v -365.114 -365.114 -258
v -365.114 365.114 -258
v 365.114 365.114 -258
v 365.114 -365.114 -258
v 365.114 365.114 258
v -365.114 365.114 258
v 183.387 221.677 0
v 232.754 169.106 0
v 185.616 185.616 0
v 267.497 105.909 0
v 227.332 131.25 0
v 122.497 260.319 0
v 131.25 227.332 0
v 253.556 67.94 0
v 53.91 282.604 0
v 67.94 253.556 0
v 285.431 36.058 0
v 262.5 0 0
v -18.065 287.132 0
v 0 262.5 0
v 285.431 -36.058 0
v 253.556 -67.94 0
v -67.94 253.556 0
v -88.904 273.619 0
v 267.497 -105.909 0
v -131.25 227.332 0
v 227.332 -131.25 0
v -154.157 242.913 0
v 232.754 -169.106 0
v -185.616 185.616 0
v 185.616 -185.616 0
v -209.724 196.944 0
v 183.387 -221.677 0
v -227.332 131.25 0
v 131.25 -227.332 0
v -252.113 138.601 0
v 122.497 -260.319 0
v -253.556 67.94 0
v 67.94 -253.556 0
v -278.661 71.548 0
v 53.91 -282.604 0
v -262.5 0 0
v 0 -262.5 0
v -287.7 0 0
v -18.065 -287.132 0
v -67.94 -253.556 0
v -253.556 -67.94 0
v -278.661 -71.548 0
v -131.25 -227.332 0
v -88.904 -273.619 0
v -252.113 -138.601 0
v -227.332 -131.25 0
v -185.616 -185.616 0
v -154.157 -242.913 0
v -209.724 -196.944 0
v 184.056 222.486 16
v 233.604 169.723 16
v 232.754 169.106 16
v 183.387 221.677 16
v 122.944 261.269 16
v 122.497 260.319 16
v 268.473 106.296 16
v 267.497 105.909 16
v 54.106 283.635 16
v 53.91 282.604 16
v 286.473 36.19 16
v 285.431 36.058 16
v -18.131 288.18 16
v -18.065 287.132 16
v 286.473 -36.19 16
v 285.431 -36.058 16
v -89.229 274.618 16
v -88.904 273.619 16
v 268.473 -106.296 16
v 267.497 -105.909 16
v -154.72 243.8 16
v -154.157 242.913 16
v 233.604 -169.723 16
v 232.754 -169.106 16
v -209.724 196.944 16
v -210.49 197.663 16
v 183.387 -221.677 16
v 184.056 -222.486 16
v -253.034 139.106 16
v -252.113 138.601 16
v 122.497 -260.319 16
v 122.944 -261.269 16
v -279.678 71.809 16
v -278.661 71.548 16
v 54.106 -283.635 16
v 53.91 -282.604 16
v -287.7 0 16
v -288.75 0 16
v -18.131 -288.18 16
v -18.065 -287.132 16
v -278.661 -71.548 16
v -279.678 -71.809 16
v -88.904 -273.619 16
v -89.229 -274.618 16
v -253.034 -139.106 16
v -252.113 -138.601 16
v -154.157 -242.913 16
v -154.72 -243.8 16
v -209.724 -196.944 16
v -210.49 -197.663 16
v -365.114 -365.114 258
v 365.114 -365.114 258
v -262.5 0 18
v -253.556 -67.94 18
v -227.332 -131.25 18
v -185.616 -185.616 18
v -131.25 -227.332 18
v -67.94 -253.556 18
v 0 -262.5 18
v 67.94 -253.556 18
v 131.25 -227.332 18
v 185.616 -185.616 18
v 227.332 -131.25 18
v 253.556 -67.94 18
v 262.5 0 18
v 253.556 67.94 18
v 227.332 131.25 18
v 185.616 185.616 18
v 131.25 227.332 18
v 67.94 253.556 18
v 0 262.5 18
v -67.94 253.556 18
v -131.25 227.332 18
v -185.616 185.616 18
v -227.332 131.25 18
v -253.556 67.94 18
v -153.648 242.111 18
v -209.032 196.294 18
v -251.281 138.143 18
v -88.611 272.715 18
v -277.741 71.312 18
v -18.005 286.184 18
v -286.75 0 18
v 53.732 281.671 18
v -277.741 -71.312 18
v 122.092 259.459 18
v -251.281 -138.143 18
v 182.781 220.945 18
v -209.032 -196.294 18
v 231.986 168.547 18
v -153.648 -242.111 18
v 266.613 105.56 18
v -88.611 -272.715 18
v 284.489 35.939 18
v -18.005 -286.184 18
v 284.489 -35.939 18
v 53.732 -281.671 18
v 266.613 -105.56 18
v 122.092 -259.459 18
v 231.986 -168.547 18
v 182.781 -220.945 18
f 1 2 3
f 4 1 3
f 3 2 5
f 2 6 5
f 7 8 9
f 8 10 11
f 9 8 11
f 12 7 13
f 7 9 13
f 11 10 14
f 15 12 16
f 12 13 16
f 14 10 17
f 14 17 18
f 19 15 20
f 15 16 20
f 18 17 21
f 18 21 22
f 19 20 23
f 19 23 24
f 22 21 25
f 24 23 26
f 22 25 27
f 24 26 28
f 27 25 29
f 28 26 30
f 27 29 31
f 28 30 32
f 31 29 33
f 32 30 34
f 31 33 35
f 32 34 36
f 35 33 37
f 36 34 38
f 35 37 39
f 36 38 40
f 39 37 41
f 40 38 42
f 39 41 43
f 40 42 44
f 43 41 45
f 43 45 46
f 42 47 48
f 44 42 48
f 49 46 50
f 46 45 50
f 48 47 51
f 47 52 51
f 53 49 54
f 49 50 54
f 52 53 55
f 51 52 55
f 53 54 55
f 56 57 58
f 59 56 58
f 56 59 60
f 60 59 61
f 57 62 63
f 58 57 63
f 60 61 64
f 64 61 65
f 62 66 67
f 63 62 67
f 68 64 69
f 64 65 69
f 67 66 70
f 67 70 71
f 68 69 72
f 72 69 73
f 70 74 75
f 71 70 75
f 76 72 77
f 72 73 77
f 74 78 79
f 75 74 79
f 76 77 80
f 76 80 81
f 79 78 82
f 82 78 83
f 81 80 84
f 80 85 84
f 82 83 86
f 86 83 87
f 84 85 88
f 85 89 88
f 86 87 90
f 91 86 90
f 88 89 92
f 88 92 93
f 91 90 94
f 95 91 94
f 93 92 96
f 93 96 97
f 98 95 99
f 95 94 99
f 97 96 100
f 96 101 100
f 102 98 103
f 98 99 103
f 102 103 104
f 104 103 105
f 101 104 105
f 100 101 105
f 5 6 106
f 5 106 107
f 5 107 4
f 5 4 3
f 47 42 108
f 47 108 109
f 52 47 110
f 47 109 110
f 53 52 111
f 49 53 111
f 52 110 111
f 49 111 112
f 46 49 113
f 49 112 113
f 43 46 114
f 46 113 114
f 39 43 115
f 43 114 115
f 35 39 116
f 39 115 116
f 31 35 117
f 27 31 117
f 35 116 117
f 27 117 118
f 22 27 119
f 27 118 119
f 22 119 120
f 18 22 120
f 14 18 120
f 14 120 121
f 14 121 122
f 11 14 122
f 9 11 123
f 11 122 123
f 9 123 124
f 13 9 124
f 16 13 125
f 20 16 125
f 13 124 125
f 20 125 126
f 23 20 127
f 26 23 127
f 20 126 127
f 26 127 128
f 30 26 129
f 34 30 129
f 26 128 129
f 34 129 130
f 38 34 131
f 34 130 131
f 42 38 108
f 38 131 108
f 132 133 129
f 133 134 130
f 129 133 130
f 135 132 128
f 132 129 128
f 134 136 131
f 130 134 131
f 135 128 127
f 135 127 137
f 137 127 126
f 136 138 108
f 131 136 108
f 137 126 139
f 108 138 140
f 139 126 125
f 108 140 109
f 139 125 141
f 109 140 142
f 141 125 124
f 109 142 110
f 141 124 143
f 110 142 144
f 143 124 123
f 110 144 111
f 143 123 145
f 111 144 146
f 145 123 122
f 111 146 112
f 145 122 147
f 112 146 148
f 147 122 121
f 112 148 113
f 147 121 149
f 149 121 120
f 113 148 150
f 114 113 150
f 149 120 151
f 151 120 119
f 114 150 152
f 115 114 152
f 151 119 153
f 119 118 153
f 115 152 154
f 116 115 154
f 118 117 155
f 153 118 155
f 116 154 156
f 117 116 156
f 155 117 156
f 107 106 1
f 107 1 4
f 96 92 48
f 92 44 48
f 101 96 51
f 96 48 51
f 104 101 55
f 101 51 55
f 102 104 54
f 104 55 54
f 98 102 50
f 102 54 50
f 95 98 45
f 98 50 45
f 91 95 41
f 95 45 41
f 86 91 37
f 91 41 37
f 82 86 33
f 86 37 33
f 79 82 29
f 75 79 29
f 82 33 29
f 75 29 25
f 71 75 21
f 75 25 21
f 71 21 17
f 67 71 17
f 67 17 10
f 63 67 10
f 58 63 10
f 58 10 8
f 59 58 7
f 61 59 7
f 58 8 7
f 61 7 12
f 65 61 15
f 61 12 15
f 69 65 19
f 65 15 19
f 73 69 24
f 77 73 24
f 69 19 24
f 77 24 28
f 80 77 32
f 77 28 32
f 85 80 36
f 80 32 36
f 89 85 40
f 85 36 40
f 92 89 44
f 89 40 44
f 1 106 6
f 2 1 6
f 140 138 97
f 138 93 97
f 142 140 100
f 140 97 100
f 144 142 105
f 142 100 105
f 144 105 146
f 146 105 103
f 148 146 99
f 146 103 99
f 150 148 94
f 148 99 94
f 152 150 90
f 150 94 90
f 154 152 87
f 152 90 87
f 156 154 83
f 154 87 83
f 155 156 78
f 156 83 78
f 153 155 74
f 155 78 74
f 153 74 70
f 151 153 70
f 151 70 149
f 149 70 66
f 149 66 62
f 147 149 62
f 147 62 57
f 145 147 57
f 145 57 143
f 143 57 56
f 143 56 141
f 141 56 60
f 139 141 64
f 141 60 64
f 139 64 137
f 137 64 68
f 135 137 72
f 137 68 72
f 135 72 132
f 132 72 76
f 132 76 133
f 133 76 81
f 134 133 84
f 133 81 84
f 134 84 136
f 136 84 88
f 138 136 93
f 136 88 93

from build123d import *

# Parameters (mm, degrees)
F2_W     = 730.228574
F2_H     = 730.228574
F3_DEPTH = 258


with BuildPart() as f1:
    # F0 (on Front) → F1 (revolve)
    with BuildSketch(Plane.XZ):
        Polygon((-287.7, 0), (-262.5, 0), (-262.5, 18), (-286.75, 18), (-288.75, 16), (-287.7, 16), align=None)
    revolve(axis=Axis((0, 0, 9), (0, 0, 1)))


with BuildPart() as f3:
    # F2 (on Top) → F3 (new body, symmetric)
    with BuildSketch(Plane.XY):
        Rectangle(F2_W, F2_H)
    extrude(amount=F3_DEPTH, both=True)


solid = Compound([f1.part, f3.part])
